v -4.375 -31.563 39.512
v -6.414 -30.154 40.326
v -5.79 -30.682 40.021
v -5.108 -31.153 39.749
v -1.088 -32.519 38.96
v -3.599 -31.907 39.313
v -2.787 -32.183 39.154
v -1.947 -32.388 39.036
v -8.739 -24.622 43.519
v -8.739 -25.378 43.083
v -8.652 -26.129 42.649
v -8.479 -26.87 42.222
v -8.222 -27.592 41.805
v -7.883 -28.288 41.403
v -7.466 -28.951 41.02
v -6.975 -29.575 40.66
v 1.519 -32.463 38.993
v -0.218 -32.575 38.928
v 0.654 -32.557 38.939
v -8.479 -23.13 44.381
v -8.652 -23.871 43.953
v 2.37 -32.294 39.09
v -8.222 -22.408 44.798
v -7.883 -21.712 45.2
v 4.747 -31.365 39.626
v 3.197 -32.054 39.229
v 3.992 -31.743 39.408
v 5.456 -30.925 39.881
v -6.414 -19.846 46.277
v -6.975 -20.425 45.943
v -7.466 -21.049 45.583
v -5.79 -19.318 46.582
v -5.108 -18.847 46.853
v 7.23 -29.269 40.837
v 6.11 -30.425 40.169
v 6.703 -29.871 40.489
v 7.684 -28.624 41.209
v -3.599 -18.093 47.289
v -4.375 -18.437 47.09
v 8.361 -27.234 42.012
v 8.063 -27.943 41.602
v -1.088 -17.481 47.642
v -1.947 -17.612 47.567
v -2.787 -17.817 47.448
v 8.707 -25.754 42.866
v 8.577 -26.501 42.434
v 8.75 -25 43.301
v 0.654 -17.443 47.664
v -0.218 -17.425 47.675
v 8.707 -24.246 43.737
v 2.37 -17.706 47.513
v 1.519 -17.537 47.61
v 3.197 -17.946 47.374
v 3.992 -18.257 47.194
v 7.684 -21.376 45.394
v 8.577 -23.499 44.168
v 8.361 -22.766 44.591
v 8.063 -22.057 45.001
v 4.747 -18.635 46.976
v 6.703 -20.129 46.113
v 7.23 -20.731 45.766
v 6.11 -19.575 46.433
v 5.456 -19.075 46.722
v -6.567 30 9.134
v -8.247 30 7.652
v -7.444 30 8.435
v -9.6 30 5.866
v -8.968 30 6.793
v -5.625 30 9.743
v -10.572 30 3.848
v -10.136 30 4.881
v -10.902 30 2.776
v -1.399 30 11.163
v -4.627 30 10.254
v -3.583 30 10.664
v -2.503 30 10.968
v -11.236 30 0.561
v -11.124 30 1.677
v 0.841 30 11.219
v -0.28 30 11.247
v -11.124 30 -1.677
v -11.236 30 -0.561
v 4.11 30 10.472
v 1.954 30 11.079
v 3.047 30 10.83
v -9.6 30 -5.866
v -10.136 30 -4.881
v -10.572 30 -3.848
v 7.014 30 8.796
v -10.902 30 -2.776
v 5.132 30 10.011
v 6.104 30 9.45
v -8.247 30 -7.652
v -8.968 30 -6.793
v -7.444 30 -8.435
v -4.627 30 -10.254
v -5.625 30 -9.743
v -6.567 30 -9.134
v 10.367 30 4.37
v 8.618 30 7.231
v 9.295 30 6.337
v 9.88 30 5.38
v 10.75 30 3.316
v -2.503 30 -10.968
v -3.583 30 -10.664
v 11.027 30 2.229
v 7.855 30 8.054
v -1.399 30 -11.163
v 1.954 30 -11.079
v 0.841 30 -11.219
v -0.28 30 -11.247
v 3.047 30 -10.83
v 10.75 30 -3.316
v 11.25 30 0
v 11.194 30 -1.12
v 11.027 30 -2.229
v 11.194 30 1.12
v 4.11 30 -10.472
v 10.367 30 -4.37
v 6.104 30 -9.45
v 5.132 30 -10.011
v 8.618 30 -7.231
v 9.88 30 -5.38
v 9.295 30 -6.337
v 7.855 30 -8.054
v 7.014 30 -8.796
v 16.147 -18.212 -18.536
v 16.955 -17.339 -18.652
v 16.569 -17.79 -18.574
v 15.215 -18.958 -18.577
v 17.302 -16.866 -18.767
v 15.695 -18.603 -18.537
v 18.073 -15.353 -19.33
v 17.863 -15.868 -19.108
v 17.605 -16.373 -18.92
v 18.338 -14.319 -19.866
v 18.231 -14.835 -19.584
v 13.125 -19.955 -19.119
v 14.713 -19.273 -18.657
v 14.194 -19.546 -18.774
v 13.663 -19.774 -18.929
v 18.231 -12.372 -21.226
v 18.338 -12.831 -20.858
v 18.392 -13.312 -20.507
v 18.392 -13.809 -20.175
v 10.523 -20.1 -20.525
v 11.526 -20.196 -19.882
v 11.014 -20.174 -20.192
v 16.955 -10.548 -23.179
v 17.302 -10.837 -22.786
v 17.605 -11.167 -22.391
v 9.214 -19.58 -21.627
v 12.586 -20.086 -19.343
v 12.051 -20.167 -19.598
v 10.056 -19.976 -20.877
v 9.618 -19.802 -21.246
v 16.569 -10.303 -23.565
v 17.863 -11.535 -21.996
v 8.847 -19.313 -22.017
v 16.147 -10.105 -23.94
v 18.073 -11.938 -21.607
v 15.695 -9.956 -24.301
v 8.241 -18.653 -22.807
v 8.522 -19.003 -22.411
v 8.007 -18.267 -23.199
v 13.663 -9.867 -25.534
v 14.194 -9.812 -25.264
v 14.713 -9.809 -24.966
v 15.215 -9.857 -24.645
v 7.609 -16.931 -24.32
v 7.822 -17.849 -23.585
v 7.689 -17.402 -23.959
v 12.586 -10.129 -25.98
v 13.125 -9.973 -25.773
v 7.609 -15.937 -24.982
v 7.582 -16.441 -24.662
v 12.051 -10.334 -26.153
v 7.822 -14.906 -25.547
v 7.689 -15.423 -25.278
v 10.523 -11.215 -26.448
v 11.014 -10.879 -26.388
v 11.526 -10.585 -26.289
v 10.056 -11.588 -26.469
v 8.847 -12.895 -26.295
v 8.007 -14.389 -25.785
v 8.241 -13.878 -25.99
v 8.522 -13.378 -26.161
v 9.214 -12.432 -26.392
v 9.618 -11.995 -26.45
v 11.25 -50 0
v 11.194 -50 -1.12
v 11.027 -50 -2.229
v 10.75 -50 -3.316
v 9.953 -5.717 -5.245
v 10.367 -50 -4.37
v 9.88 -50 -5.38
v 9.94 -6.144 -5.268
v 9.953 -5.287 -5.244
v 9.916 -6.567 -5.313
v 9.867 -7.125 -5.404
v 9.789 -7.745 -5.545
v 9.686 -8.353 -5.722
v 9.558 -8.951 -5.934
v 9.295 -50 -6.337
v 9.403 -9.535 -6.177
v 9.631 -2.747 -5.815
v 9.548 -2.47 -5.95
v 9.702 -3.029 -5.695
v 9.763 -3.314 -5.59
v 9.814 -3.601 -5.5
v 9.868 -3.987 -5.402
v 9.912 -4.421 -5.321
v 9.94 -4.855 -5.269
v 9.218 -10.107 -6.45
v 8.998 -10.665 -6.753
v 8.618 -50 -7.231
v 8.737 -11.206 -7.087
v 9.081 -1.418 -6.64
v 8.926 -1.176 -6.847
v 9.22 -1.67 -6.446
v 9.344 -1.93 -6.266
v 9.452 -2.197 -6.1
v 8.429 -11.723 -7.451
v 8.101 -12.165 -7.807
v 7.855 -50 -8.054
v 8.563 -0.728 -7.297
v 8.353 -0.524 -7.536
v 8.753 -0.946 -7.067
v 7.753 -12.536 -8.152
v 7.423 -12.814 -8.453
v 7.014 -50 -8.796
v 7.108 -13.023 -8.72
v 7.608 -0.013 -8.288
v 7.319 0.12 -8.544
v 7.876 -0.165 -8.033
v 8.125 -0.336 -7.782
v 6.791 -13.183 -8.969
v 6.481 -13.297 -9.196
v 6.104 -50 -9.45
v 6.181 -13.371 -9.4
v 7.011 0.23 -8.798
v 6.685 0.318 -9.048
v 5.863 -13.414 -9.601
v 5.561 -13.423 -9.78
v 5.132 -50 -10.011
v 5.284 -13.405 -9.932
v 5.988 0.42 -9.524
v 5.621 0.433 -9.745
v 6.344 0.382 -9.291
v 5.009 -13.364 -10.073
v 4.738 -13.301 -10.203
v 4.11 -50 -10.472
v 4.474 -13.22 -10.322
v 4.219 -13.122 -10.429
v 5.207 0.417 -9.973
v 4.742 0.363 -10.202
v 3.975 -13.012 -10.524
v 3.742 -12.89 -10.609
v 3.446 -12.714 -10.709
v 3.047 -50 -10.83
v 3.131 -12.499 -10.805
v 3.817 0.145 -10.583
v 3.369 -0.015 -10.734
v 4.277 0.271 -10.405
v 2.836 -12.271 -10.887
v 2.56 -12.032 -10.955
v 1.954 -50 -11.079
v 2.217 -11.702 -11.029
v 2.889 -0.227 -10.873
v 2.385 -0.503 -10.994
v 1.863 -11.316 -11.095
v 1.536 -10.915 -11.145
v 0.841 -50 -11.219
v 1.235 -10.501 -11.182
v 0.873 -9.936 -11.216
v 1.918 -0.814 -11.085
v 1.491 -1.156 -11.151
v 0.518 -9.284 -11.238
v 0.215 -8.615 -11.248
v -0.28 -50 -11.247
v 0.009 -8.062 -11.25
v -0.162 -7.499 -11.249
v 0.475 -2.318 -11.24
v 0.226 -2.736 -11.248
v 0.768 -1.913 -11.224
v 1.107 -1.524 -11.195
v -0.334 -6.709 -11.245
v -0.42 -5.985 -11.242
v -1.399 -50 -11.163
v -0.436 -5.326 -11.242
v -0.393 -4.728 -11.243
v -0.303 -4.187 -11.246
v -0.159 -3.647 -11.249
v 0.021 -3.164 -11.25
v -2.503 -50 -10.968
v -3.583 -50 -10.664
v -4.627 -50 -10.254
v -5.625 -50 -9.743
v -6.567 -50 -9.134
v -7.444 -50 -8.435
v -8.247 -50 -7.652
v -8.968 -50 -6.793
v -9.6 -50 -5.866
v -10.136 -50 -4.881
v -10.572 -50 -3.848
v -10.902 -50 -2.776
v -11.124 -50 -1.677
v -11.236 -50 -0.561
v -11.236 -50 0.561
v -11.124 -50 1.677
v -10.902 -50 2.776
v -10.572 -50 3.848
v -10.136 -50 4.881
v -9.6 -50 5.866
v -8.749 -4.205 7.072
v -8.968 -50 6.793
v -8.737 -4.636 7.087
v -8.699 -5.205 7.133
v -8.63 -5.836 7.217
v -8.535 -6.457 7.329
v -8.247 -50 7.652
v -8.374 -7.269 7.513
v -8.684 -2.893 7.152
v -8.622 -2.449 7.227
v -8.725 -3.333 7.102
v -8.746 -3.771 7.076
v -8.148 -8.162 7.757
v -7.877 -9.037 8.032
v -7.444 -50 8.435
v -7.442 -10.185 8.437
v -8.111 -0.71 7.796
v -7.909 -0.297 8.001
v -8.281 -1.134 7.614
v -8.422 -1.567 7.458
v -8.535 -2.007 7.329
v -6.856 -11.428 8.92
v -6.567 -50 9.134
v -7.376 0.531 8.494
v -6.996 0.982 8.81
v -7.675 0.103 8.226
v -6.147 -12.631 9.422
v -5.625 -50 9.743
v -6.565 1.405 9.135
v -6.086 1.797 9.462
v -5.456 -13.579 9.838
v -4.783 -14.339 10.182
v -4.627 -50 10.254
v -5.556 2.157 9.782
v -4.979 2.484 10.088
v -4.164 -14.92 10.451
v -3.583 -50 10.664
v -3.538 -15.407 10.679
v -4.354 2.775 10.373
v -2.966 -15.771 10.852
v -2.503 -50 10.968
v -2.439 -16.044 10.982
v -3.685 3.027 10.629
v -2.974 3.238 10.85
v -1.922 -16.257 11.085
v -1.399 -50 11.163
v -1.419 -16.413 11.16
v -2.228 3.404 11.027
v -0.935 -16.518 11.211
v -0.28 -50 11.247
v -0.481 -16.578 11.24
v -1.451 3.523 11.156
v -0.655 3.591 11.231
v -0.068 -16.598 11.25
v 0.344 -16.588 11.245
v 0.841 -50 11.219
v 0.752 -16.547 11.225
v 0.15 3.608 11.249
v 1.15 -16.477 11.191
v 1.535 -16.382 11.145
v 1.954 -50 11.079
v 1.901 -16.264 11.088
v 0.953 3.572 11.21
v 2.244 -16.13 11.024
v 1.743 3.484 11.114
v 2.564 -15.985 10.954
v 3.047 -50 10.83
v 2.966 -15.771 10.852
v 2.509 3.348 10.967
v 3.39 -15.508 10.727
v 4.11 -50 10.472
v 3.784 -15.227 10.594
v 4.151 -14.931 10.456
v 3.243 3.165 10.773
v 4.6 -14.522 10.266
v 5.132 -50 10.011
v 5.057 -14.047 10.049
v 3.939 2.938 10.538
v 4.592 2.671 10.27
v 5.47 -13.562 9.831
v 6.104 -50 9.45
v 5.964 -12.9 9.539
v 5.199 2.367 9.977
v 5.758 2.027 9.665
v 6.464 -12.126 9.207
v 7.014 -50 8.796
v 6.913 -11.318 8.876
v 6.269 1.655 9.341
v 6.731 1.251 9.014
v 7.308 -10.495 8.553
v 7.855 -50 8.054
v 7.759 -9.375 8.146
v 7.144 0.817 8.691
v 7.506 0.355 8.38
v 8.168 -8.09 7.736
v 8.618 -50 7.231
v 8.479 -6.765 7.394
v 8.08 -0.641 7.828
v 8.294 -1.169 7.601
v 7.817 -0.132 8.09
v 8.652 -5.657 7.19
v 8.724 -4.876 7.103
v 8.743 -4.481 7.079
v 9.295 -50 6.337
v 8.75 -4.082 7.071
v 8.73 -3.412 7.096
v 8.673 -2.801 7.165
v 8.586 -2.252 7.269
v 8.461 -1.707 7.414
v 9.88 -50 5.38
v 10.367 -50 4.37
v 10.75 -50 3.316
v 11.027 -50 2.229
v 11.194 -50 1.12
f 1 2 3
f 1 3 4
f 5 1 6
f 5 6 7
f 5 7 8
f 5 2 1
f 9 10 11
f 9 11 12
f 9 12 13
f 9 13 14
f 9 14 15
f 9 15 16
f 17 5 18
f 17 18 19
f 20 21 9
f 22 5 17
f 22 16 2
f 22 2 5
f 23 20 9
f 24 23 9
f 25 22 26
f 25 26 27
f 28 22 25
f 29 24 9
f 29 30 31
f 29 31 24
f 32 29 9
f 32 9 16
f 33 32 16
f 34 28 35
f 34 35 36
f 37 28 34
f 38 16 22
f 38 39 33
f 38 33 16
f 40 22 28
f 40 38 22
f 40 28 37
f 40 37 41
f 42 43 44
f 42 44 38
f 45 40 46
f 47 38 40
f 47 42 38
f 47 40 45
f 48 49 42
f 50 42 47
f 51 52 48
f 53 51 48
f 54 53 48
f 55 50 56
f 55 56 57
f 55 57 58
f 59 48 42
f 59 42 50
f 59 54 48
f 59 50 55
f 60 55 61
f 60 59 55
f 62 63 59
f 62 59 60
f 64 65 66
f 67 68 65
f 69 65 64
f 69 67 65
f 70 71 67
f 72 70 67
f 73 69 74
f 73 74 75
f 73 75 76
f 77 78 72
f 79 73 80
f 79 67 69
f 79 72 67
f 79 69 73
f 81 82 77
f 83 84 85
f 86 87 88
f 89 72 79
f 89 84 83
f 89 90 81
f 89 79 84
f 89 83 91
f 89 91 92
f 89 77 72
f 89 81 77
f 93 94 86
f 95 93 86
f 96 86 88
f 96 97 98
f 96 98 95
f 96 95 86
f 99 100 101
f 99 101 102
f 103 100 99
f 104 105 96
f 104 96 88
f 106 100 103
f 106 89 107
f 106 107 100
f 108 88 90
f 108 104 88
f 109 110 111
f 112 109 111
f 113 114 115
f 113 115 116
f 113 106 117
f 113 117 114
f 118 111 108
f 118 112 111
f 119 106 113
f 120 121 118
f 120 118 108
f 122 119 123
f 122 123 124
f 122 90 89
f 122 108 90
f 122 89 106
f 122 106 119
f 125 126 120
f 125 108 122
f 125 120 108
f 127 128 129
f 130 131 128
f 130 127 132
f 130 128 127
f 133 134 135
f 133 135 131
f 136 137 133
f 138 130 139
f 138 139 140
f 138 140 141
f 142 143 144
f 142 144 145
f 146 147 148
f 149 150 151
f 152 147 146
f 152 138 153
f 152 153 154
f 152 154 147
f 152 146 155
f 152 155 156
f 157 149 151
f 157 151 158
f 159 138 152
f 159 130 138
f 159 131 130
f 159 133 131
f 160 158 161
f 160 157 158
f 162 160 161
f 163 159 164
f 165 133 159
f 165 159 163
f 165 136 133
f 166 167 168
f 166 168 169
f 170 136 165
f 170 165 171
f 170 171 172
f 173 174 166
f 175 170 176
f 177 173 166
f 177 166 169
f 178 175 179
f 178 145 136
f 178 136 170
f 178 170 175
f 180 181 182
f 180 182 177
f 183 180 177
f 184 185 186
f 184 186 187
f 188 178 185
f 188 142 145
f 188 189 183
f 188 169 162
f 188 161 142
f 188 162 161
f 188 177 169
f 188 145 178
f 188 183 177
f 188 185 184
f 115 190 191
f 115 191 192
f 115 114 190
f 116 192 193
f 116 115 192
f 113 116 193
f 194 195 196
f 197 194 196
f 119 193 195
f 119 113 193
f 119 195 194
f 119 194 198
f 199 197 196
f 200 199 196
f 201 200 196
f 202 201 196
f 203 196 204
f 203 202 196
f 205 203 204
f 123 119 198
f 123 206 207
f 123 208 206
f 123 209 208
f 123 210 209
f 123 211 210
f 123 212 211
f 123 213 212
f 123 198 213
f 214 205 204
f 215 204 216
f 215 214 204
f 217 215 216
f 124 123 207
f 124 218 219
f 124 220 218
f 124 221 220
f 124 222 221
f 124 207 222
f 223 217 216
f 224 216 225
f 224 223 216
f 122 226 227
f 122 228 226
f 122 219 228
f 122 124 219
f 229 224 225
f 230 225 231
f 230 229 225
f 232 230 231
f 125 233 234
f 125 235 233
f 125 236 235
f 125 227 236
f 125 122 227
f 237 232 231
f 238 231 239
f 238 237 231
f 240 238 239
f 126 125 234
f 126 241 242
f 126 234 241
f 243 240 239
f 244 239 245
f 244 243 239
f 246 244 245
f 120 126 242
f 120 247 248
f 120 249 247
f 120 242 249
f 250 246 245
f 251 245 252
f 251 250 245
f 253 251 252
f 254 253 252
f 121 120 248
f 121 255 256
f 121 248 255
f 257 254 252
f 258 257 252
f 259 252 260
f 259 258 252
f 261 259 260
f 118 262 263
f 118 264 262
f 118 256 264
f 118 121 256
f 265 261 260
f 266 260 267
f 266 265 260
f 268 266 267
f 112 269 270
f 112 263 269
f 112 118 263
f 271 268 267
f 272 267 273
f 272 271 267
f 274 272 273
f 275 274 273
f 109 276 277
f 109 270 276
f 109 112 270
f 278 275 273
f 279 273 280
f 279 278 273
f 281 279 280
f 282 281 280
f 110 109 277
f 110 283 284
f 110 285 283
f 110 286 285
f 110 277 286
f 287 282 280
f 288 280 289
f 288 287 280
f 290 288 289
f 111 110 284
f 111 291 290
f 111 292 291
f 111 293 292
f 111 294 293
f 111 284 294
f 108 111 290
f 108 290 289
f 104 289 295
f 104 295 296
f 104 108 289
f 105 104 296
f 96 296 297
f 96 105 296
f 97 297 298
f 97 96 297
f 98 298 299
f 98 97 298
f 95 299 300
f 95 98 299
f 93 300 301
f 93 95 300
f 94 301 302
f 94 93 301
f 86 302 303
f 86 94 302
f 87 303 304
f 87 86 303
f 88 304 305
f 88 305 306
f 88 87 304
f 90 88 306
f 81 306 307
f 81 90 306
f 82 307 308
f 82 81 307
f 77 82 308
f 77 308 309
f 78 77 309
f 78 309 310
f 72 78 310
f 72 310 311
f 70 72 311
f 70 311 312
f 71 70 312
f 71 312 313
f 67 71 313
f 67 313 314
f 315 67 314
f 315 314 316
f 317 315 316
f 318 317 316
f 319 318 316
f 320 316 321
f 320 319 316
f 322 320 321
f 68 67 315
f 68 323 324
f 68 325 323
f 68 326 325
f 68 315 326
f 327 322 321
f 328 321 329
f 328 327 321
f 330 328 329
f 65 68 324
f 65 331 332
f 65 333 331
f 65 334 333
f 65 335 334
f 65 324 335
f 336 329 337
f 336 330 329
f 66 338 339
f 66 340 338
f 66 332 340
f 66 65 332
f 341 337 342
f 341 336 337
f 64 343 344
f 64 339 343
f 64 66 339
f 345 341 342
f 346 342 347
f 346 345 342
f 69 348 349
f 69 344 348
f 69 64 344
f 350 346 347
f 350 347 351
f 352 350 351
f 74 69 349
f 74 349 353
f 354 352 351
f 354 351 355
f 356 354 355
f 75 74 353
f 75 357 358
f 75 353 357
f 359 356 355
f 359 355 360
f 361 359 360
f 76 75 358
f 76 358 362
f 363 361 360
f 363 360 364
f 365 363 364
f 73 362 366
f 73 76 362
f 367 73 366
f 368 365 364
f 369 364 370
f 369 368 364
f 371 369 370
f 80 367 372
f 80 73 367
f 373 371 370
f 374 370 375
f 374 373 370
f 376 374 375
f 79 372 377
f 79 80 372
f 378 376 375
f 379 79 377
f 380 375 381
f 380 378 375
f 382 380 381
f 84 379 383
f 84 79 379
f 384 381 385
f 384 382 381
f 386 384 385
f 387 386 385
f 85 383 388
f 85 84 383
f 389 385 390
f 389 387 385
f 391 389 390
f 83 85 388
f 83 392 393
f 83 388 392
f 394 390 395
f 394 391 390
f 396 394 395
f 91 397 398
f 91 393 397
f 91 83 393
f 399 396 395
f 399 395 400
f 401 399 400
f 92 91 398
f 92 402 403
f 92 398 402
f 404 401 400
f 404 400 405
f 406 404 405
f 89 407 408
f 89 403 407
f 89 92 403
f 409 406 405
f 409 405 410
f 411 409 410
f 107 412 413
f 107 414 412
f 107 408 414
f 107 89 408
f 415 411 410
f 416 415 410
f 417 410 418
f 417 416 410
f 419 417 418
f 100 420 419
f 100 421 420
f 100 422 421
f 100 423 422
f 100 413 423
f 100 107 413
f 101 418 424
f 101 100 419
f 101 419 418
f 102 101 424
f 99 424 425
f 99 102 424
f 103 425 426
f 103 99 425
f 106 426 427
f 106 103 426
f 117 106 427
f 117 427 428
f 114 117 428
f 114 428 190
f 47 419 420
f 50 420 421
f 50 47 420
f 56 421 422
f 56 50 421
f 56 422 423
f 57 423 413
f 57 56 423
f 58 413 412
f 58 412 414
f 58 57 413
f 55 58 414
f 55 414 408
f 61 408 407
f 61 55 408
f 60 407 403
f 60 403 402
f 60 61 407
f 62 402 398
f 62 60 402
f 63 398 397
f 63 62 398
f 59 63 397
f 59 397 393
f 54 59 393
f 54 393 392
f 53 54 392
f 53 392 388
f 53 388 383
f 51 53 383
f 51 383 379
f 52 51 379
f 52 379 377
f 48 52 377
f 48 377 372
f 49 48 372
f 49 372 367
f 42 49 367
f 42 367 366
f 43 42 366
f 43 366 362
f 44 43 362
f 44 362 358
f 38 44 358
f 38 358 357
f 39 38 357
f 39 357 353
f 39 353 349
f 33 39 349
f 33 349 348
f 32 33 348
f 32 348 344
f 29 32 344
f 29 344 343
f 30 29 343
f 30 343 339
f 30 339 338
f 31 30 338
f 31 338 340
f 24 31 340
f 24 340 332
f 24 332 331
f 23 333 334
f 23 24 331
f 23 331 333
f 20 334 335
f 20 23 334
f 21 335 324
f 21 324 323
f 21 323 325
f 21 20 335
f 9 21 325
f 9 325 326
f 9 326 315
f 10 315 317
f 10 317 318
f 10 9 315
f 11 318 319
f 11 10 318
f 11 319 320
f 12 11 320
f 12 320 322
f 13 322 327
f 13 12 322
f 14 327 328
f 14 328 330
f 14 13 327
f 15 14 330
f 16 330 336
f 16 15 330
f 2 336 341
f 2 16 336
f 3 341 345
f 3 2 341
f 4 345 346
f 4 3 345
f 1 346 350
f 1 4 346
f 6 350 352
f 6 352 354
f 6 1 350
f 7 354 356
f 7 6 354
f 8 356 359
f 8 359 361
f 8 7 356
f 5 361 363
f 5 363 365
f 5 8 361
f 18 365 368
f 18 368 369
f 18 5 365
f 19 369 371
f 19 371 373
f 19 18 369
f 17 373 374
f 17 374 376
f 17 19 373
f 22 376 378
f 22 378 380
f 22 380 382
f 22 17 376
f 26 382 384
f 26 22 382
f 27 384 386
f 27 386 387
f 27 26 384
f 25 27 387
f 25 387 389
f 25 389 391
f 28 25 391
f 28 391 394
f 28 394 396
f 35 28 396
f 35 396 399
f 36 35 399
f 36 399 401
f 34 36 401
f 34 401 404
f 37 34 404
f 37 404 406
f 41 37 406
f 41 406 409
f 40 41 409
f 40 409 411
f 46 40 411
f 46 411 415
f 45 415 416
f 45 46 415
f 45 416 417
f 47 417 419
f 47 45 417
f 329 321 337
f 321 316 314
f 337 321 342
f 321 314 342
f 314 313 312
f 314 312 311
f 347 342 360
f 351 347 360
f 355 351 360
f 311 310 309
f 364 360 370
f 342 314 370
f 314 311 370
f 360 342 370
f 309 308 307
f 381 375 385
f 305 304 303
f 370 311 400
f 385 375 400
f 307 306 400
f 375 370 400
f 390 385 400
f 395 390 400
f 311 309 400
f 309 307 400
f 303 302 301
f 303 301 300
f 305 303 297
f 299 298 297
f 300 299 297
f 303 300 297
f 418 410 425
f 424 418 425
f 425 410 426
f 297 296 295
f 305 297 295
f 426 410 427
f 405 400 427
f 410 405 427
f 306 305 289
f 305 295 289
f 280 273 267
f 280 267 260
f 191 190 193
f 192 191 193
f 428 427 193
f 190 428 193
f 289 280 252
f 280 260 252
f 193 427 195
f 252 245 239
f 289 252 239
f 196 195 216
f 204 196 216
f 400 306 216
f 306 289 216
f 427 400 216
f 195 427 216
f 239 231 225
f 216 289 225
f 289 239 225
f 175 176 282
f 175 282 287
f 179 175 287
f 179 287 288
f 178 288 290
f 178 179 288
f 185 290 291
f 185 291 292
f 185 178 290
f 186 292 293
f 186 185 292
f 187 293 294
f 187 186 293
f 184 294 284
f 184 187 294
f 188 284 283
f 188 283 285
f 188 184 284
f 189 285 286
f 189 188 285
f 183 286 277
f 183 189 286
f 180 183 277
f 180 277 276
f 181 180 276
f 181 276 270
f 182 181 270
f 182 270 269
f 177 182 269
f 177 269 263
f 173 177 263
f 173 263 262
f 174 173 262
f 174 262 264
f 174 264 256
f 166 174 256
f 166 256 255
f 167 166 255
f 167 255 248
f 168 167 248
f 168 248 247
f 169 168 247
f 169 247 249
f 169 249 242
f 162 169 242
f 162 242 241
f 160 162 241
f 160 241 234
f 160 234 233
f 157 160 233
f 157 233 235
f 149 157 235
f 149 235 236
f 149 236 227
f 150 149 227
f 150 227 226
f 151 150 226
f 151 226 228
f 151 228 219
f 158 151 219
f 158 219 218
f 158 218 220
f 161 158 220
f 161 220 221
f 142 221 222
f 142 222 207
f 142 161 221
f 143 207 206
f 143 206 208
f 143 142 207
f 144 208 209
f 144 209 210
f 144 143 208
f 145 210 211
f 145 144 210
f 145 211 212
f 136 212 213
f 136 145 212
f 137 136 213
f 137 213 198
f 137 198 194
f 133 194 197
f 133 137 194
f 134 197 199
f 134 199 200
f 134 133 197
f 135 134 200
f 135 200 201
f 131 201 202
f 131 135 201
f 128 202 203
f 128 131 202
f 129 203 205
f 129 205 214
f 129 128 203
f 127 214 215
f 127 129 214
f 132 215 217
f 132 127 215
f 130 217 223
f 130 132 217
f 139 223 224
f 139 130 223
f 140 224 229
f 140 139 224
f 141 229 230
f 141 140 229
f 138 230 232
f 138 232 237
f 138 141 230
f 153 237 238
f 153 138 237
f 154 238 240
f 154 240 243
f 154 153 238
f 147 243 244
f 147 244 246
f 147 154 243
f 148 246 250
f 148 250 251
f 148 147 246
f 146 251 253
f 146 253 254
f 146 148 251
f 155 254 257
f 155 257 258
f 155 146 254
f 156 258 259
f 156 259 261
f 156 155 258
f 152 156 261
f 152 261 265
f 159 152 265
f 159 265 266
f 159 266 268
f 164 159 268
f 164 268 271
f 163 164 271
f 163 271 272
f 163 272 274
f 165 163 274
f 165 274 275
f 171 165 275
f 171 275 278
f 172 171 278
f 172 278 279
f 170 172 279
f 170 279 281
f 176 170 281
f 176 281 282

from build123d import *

# Parameters (mm, degrees)
BOSS_EXTRUDE1_DEPTH      = 30
BOSS_EXTRUDE1_DEPTH_BACK = 50
SKETCH2_R                = 11.25
BOSS_EXTRUDE2_REACH      = 80.278
BOSS_EXTRUDE2_END_RADIUS = 11.25
SKETCH4_R                = 8.75
BOSS_EXTRUDE3_REACH      = 88.818
BOSS_EXTRUDE3_END_RADIUS = 11.25
SKETCH11_R               = 6


with BuildPart() as part:
    # Sketch2 → Boss-Extrude1 (new, two sides: drawn at the far end of the back side and taken through both)
    with BuildSketch(Plane(origin=(0, 0, 0), x_dir=(1, 0, 0), z_dir=(0, 1, 0)).offset(-BOSS_EXTRUDE1_DEPTH_BACK)):
        Circle(SKETCH2_R)
    extrude(amount=BOSS_EXTRUDE1_DEPTH + BOSS_EXTRUDE1_DEPTH_BACK)

    # Boss-Extrude2: up to this cylinder (the profile starts outside it)
    boss_extrude2_end = Plane(origin=(0, -25, 0), z_dir=(0, -1, 0)) * Cylinder(BOSS_EXTRUDE2_END_RADIUS, 184.056, mode=Mode.PRIVATE)
    # Sketch4 → Boss-Extrude2 (add, up to the surface)
    with BuildSketch(Plane(origin=(0, -25, 43.301270189), x_dir=(1, 0, 0), z_dir=(0, -0.5000000000000012, 0.866025403784438)), mode=Mode.PRIVATE) as boss_extrude2_sk1:
        Circle(SKETCH4_R)
    boss_extrude2_tool1 = extrude(boss_extrude2_sk1.sketch, amount=-BOSS_EXTRUDE2_REACH, mode=Mode.PRIVATE) - boss_extrude2_end
    add(boss_extrude2_tool1.solids().sort_by_distance((0, -25, 43.30127))[0])

    # Boss-Extrude3: up to this cylinder (the profile starts outside it)
    boss_extrude3_end = Plane(origin=(0, -15, 0), z_dir=(0, -1, 0)) * Cylinder(BOSS_EXTRUDE3_END_RADIUS, 201.136, mode=Mode.PRIVATE)
    # Sketch11 → Boss-Extrude3 (add, up to the surface)
    with BuildSketch(Plane(origin=(12.990381057, -15, -22.5), x_dir=(-0.9013878188659962, -0.24019223070762985, -0.36028834606144955), z_dir=(0.43301270189222174, -0.4999999999999946, -0.7500000000000021)), mode=Mode.PRIVATE) as boss_extrude3_sk1:
        Circle(SKETCH11_R)
    boss_extrude3_tool1 = extrude(boss_extrude3_sk1.sketch, amount=-BOSS_EXTRUDE3_REACH, mode=Mode.PRIVATE) - boss_extrude3_end
    add(boss_extrude3_tool1.solids().sort_by_distance((12.990381, -15, -22.5))[0])


solid = part.part
